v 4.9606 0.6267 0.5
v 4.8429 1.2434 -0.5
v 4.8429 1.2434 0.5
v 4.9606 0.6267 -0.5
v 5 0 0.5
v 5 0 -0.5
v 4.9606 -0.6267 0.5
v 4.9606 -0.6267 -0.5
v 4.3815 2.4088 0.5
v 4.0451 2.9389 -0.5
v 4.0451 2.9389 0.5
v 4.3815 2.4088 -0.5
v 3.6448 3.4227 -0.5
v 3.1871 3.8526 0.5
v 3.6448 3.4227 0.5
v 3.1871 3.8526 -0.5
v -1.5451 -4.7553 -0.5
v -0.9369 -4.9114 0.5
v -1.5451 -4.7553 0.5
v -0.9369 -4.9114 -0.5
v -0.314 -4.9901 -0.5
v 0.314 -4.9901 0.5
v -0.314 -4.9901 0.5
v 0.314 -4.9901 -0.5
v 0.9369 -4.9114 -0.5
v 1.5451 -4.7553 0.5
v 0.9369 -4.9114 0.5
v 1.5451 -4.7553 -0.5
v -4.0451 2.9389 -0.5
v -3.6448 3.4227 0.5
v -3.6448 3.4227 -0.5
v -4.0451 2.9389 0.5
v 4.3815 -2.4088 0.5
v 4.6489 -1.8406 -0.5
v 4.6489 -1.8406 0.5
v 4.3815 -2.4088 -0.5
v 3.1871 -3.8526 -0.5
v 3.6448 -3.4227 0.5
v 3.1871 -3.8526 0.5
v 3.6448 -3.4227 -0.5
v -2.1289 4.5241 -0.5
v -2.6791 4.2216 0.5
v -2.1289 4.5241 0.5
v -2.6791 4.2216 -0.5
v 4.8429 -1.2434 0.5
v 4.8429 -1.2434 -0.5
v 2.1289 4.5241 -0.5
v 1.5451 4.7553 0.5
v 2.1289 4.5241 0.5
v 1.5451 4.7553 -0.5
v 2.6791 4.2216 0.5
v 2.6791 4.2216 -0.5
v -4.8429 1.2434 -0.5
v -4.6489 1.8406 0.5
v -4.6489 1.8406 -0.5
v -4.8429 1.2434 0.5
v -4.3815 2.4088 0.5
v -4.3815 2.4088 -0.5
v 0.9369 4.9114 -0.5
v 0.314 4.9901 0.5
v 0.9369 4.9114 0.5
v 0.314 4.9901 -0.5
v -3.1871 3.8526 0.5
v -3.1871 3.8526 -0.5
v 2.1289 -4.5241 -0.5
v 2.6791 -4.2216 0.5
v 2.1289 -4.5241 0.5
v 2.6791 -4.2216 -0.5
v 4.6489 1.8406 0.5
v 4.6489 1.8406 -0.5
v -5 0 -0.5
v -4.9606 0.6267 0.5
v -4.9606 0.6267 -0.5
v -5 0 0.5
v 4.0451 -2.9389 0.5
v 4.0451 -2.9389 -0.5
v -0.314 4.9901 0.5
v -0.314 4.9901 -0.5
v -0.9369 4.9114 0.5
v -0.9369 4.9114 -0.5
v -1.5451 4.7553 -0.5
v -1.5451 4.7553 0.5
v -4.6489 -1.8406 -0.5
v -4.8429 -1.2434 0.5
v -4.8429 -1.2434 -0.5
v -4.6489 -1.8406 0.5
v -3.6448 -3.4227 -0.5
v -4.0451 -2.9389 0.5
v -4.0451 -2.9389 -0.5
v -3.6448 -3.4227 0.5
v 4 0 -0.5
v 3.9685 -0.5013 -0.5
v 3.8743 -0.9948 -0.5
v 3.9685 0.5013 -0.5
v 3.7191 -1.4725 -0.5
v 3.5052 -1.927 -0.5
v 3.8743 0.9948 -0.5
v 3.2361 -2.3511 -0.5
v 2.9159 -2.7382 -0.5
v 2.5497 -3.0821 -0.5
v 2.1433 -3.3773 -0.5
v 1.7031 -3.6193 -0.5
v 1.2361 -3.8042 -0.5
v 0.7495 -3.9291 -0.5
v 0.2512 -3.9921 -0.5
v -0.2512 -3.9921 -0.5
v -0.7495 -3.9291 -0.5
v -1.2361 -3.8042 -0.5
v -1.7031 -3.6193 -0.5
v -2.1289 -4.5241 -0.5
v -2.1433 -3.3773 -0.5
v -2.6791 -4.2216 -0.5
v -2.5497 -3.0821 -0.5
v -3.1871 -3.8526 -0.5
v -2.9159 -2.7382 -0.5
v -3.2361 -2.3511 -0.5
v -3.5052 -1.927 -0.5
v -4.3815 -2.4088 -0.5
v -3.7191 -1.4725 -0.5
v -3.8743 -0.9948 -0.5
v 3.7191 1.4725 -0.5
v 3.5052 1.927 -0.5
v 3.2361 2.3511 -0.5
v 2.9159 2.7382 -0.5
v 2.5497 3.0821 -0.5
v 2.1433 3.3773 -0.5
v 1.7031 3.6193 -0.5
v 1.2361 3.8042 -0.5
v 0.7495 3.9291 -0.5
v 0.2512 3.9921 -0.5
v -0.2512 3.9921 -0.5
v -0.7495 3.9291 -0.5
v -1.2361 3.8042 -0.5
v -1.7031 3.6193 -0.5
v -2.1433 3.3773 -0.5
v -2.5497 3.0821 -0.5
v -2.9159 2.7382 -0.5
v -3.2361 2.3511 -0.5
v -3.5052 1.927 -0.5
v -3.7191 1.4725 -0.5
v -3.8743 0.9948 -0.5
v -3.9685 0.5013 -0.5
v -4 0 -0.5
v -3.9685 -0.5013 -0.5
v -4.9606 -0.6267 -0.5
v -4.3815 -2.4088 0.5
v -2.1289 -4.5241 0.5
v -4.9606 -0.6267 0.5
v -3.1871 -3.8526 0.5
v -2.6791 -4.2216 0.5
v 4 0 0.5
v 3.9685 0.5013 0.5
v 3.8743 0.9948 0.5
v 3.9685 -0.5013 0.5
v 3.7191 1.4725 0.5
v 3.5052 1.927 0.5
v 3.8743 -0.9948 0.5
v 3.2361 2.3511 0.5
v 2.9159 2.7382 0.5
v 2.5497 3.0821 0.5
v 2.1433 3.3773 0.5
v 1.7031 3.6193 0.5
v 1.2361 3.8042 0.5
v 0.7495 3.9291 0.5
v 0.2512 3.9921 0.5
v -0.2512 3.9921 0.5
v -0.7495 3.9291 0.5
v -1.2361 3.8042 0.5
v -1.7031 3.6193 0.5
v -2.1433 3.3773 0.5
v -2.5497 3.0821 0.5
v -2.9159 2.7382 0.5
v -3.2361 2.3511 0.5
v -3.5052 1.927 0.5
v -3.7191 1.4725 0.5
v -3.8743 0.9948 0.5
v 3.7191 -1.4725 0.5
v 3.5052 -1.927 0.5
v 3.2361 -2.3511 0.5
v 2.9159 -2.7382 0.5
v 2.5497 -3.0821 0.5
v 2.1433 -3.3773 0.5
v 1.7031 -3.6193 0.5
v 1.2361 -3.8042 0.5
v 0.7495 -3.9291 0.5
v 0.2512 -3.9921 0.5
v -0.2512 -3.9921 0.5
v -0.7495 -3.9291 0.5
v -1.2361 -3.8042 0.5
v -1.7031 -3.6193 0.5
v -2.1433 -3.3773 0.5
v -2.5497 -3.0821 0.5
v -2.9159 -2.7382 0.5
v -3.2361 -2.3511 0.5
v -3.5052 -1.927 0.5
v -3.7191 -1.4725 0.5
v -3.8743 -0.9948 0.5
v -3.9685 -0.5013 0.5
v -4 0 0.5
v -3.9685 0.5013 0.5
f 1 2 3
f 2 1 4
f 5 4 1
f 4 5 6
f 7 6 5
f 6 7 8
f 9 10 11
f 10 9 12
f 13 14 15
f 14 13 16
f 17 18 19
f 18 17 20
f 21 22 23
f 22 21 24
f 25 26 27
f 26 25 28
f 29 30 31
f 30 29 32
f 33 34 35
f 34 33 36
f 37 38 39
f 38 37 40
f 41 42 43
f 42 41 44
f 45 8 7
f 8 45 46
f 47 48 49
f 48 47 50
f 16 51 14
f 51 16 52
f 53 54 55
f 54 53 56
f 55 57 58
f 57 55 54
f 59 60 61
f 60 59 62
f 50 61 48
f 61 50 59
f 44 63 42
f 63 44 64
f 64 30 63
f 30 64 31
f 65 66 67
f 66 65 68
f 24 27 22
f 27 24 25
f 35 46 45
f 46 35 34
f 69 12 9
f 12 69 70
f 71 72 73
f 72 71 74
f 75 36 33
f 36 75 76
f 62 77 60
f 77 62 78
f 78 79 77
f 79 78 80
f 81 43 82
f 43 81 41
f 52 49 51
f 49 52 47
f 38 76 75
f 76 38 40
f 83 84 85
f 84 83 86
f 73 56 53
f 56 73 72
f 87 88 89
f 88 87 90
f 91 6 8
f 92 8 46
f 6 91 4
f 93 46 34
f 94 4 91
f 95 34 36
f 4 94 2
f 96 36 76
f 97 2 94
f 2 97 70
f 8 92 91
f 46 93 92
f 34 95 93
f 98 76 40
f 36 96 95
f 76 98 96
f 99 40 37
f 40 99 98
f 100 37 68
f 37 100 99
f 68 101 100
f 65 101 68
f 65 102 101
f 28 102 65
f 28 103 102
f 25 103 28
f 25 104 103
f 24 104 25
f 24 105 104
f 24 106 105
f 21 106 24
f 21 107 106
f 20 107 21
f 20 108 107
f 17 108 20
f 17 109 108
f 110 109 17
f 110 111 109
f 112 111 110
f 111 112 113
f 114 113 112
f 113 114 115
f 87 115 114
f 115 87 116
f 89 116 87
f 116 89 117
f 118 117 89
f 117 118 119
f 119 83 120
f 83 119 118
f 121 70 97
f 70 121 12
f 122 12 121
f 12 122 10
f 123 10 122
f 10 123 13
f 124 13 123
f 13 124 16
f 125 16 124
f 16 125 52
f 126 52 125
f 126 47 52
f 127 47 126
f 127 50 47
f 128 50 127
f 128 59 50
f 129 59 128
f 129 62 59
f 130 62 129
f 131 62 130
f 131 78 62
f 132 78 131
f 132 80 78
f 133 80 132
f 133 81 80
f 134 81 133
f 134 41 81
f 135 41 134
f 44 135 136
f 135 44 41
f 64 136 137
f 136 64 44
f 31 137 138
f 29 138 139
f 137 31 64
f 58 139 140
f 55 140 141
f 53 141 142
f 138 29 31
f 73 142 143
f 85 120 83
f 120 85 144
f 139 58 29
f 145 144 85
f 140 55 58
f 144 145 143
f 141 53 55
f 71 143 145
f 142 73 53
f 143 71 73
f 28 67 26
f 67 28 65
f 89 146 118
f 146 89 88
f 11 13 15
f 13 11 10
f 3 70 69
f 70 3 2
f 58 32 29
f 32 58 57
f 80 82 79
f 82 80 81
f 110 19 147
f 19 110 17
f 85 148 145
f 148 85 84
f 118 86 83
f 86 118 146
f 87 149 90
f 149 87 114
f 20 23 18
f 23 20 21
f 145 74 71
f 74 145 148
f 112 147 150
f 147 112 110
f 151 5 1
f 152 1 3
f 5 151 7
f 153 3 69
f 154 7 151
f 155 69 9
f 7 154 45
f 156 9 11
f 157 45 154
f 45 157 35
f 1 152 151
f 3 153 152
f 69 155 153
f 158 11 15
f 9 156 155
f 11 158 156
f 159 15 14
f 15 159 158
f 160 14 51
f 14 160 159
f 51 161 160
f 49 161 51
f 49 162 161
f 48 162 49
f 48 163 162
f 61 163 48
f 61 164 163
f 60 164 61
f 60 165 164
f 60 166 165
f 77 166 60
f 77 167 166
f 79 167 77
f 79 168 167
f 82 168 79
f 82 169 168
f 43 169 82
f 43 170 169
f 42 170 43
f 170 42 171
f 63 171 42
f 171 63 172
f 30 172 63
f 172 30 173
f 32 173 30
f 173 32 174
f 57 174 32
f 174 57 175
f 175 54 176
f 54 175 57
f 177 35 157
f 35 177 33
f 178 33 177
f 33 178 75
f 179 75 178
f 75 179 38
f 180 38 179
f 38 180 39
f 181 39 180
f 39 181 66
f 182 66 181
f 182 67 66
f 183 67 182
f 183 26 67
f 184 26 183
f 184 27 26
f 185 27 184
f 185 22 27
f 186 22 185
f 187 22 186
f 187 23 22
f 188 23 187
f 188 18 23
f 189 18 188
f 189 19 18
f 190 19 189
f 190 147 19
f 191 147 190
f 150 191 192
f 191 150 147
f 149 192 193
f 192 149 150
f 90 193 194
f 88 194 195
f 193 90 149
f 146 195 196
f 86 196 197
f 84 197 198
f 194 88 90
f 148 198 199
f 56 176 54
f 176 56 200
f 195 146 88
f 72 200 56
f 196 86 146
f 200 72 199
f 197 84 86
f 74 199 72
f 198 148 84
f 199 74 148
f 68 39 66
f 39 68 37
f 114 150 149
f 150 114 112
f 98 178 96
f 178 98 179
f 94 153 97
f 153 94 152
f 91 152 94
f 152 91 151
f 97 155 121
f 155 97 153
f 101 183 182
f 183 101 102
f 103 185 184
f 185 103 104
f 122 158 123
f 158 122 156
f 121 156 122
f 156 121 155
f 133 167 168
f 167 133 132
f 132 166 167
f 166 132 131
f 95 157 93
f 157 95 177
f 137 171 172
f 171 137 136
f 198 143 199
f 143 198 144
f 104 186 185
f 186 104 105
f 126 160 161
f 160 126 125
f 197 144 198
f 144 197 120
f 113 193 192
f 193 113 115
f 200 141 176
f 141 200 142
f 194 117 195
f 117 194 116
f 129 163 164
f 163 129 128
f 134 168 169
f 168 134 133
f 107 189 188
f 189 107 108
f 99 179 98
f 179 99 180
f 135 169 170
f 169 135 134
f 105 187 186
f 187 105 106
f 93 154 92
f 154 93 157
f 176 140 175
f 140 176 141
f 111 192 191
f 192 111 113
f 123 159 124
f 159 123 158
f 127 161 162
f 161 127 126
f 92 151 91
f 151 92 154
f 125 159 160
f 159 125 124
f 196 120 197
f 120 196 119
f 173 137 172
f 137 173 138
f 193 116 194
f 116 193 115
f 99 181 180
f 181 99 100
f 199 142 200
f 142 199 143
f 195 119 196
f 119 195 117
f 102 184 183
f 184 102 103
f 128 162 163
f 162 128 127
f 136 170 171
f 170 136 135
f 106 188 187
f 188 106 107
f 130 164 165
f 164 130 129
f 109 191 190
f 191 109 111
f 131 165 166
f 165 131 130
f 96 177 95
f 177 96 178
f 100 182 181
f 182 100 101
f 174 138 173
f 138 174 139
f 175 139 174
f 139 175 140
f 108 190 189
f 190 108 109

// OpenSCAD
$fn = 50;


difference() {
	union() {
		translate(v = [0, 0, -0.5000000000]) {
			cylinder(h = 1, r = 5.0000000000);
		}
	}
	union() {
		translate(v = [0, 0, -100.0000000000]) {
			cylinder(h = 200, r = 4.0000000000);
		}
	}
}
